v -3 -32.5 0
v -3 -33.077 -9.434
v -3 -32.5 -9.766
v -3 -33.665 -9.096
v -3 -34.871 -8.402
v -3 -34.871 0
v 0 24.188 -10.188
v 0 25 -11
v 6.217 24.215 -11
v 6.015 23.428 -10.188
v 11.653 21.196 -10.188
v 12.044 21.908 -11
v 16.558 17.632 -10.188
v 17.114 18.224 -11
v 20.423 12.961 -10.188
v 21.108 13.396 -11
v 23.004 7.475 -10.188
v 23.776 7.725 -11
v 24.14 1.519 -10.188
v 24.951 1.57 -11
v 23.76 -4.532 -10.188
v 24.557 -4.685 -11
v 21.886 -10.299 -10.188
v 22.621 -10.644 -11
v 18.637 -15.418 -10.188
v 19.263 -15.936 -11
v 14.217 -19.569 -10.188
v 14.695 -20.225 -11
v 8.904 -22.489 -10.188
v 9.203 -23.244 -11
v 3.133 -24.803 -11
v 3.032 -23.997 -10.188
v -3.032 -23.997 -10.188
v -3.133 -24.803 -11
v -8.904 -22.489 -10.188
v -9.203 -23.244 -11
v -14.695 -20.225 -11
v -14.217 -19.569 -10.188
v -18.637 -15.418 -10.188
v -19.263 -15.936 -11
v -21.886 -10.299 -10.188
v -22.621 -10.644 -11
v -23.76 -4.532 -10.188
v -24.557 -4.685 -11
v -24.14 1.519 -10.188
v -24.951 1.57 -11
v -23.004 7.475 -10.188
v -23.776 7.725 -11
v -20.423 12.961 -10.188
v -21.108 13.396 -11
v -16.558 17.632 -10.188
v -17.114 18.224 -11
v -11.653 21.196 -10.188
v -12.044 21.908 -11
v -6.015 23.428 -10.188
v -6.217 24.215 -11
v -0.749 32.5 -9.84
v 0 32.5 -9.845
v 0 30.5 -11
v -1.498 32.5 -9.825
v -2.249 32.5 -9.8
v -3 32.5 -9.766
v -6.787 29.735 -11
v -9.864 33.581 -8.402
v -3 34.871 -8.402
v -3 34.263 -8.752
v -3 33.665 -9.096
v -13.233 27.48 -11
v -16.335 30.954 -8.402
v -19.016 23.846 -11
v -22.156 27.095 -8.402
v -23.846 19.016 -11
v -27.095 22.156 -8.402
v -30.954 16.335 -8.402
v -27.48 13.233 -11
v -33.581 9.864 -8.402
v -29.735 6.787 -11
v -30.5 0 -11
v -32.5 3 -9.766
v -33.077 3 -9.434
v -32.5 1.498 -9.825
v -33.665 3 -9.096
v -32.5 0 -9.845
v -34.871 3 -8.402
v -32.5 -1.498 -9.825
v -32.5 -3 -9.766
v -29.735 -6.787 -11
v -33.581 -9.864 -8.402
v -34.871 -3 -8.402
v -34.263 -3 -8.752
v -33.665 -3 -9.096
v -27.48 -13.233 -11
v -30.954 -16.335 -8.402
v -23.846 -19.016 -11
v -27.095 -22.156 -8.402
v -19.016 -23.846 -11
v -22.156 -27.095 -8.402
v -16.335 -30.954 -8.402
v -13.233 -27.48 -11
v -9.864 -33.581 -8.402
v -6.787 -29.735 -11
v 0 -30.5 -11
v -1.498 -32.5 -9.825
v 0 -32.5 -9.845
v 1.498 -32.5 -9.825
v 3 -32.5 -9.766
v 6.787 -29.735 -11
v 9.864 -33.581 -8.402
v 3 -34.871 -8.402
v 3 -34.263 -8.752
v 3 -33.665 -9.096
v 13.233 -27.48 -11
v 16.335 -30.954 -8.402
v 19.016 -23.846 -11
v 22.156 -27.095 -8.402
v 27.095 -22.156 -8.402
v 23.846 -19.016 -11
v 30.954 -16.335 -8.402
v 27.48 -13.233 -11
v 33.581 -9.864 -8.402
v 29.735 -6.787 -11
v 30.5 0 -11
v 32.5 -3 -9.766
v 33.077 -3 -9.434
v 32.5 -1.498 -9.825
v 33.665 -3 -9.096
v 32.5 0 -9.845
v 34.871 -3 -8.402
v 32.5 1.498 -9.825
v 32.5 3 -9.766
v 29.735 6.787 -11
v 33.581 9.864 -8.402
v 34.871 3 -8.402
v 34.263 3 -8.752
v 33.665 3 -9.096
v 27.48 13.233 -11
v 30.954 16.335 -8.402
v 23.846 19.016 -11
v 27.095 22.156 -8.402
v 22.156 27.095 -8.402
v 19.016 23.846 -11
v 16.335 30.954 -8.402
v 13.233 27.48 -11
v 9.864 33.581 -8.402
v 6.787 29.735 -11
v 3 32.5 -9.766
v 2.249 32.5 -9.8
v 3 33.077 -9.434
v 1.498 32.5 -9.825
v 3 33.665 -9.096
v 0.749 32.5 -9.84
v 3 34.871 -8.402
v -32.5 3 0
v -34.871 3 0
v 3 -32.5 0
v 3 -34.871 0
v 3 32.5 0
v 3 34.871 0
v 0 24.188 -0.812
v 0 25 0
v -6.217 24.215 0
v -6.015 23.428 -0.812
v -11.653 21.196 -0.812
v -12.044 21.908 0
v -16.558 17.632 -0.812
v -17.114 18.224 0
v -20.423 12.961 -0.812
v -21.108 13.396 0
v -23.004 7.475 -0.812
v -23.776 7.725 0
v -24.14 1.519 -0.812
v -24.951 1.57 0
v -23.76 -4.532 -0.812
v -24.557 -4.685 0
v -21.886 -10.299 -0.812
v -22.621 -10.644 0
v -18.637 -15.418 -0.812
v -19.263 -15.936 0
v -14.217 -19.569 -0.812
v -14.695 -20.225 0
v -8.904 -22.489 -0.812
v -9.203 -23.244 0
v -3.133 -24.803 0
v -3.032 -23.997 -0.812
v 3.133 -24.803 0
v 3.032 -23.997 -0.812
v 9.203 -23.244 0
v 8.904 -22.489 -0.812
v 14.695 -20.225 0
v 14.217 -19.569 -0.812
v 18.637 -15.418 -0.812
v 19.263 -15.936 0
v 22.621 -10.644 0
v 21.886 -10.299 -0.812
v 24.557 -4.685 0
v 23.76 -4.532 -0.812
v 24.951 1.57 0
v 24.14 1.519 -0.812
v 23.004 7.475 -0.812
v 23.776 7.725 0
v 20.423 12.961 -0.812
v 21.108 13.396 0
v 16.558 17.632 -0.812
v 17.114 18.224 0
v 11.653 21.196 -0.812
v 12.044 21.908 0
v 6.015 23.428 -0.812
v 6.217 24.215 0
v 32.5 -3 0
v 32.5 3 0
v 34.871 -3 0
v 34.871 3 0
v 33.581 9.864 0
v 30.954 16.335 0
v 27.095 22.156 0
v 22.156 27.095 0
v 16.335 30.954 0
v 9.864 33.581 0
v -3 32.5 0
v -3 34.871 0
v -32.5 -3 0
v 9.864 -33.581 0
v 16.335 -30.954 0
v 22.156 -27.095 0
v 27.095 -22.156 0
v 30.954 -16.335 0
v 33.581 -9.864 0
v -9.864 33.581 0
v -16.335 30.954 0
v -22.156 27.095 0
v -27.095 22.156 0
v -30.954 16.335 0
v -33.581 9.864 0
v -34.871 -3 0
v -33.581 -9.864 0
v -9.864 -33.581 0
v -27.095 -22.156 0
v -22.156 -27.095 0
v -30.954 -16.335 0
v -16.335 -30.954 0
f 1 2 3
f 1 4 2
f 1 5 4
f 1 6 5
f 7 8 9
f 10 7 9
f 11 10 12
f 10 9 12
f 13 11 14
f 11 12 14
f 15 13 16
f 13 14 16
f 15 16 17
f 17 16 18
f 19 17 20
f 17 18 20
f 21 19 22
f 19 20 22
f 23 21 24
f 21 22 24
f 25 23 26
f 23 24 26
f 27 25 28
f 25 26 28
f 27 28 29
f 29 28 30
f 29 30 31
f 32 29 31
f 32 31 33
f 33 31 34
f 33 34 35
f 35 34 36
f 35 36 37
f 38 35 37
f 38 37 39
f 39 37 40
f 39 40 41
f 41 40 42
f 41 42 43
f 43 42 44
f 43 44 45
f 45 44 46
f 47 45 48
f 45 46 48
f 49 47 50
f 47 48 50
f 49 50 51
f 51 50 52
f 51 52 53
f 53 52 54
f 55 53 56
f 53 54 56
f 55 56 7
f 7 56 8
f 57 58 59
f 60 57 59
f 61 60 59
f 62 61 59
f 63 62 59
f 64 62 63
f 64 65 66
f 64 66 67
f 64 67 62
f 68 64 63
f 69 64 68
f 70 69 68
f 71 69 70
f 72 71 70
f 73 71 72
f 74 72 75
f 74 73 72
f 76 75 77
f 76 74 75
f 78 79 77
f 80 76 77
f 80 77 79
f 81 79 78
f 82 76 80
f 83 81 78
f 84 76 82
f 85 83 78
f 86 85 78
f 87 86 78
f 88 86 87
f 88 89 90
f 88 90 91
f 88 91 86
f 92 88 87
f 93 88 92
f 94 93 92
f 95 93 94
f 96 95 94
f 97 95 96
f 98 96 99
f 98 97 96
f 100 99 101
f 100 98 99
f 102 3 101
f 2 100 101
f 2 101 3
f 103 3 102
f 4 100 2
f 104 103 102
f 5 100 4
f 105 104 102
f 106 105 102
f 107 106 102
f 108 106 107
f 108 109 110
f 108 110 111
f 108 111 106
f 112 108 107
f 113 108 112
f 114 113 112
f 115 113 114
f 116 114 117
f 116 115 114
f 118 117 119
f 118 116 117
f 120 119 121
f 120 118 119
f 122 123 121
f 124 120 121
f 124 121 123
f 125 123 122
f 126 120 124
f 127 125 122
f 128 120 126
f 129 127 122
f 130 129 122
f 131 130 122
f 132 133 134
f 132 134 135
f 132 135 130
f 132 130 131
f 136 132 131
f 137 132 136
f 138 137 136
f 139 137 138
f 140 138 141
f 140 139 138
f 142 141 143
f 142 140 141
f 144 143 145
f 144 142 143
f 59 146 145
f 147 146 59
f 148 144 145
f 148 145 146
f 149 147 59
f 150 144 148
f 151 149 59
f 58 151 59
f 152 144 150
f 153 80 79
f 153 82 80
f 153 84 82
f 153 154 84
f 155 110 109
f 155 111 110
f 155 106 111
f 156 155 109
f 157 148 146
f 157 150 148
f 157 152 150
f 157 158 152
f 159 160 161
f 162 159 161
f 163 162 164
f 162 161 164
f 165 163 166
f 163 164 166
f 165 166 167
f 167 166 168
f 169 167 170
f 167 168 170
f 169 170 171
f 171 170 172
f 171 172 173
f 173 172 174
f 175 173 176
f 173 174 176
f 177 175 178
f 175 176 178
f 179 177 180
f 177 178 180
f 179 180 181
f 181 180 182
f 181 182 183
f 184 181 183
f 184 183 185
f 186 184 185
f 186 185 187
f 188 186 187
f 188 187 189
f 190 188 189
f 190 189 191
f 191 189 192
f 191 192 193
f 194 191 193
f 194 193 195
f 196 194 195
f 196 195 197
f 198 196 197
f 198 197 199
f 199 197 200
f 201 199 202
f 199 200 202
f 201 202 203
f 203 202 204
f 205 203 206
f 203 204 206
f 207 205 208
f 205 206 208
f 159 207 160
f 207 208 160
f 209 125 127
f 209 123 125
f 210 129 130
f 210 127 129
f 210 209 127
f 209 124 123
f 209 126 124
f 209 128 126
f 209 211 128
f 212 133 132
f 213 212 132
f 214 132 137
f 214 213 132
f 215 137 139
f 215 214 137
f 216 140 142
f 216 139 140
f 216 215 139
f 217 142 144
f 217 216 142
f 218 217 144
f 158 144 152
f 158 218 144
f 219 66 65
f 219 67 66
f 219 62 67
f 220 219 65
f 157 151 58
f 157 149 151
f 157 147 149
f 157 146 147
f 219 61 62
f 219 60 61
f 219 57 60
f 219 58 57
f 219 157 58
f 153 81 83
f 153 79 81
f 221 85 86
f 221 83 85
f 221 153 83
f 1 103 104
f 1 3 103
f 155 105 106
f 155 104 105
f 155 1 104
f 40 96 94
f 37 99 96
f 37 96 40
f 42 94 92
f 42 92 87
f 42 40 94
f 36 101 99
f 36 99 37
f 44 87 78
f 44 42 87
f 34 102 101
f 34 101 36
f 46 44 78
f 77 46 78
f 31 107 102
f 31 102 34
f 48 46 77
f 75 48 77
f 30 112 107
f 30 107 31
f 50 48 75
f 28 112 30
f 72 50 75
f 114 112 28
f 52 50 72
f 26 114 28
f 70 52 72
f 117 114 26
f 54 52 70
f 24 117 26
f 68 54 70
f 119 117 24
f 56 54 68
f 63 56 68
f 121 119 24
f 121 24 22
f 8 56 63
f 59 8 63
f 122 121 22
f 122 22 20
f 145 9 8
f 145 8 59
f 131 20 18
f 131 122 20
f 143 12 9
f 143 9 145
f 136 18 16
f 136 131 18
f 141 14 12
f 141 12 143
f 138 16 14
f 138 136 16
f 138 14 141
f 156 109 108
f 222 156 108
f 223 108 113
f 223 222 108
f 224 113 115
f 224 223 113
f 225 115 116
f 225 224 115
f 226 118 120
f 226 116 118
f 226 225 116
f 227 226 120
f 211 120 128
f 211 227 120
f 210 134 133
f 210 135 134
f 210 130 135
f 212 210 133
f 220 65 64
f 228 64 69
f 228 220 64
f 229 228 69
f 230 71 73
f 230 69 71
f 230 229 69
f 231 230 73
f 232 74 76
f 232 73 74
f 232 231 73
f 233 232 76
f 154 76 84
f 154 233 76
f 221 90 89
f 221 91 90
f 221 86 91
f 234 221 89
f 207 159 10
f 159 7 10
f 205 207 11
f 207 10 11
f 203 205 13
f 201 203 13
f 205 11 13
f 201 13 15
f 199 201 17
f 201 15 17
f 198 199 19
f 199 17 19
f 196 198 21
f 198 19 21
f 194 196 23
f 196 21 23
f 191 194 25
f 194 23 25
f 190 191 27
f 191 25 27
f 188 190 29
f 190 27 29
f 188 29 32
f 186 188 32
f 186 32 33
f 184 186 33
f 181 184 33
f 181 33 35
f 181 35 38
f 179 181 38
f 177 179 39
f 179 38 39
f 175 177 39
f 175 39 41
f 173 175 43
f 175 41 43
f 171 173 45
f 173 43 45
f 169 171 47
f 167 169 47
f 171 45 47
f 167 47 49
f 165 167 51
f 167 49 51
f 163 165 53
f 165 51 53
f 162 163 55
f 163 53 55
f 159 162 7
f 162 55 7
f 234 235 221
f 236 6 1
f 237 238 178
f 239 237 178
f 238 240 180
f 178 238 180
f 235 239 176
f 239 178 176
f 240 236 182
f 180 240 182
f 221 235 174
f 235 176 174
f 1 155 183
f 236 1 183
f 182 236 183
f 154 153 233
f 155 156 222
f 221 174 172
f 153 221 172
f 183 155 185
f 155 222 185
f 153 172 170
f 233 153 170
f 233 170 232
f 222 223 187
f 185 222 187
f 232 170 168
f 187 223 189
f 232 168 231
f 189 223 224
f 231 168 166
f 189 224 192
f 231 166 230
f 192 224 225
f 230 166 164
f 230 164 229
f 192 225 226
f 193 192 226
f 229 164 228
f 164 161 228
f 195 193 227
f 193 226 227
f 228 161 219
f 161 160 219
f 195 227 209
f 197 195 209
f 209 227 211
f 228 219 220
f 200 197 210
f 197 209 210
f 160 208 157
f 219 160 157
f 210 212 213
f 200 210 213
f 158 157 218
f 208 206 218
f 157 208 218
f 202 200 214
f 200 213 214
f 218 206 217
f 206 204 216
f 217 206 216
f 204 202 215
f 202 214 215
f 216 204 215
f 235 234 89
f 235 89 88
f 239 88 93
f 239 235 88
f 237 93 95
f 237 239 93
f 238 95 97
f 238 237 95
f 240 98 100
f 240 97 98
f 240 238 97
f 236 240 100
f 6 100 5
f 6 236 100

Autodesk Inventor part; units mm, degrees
sketch "Sketch_1" plane through (0, 0, 0) normal (1, 0, 0) x (0, 1, 0)
  line L0 (0, -11) -> (0, 0)
  line L1 (25, 0) -> (24.188, -0.812)
  line L2 (24.188, -0.812) -> (24.188, -10.188)
  line L3 (24.188, -10.188) -> (25, -11)
  line L4 (25, -11) -> (30.5, -11)
  line L5 (30.5, -11) -> (35, -8.4019)
  line L6 (35, -8.4019) -> (35, 0)
  line L7 (35, 0) -> (25, 0)
revolve "Revolution1" add sketch "Sketch_1" angle 360 about axis through (0, 0, -11) along (0, 0, -1)
thread "Thread1" size "M50x1.5" class "6H" standard "ISO Metric profile" full length
sketch "Sketch_2" plane through (0, 0, 0) normal (0, 0, 1) x (1, 0, 0)
  circle A0 centre (0, 0) radius 70
  arc A1 (-53.7625, -3) -> (-3, -53.7625) centre (0, 0) ccw
  line L0 (-3, -53.7625) -> (-3, -32.5)
  line L1 (-3, -32.5) -> (3, -32.5)
  line L2 (3, -32.5) -> (3, -53.7625)
  arc A2 (3, -53.7625) -> (53.7625, -3) centre (0, 0) ccw
  line L3 (53.7625, -3) -> (32.5, -3)
  line L4 (32.5, -3) -> (32.5, 3)
  line L5 (32.5, 3) -> (53.7625, 3)
  arc A3 (53.7625, 3) -> (3, 53.7625) centre (0, 0) ccw
  line L6 (3, 53.7625) -> (3, 32.5)
  line L7 (3, 32.5) -> (-3, 32.5)
  line L8 (-3, 32.5) -> (-3, 53.7625)
  arc A4 (-3, 53.7625) -> (-53.7625, 3) centre (0, 0) ccw
  line L9 (-53.7625, 3) -> (-32.5, 3)
  line L10 (-32.5, 3) -> (-32.5, -3)
  line L11 (-32.5, -3) -> (-53.7625, -3)
extrude "Extrusion1" cut sketch "Sketch_2" against normal blind 11
ref_plane "wash_to_nut_XY" through (0, 0, -11) normal (0, 0, 1) x (1, 0, 0)
ref_plane "wash_to_nut_YZ" through (0, 0, -11) normal (1, 0, 0) x (0, 1, 0)
ref_plane "wash_to_nut_ZX" through (0, 0, -11) normal (0, 1, 0) x (0, 0, 1)
properties part number "JLNSK50nut"
